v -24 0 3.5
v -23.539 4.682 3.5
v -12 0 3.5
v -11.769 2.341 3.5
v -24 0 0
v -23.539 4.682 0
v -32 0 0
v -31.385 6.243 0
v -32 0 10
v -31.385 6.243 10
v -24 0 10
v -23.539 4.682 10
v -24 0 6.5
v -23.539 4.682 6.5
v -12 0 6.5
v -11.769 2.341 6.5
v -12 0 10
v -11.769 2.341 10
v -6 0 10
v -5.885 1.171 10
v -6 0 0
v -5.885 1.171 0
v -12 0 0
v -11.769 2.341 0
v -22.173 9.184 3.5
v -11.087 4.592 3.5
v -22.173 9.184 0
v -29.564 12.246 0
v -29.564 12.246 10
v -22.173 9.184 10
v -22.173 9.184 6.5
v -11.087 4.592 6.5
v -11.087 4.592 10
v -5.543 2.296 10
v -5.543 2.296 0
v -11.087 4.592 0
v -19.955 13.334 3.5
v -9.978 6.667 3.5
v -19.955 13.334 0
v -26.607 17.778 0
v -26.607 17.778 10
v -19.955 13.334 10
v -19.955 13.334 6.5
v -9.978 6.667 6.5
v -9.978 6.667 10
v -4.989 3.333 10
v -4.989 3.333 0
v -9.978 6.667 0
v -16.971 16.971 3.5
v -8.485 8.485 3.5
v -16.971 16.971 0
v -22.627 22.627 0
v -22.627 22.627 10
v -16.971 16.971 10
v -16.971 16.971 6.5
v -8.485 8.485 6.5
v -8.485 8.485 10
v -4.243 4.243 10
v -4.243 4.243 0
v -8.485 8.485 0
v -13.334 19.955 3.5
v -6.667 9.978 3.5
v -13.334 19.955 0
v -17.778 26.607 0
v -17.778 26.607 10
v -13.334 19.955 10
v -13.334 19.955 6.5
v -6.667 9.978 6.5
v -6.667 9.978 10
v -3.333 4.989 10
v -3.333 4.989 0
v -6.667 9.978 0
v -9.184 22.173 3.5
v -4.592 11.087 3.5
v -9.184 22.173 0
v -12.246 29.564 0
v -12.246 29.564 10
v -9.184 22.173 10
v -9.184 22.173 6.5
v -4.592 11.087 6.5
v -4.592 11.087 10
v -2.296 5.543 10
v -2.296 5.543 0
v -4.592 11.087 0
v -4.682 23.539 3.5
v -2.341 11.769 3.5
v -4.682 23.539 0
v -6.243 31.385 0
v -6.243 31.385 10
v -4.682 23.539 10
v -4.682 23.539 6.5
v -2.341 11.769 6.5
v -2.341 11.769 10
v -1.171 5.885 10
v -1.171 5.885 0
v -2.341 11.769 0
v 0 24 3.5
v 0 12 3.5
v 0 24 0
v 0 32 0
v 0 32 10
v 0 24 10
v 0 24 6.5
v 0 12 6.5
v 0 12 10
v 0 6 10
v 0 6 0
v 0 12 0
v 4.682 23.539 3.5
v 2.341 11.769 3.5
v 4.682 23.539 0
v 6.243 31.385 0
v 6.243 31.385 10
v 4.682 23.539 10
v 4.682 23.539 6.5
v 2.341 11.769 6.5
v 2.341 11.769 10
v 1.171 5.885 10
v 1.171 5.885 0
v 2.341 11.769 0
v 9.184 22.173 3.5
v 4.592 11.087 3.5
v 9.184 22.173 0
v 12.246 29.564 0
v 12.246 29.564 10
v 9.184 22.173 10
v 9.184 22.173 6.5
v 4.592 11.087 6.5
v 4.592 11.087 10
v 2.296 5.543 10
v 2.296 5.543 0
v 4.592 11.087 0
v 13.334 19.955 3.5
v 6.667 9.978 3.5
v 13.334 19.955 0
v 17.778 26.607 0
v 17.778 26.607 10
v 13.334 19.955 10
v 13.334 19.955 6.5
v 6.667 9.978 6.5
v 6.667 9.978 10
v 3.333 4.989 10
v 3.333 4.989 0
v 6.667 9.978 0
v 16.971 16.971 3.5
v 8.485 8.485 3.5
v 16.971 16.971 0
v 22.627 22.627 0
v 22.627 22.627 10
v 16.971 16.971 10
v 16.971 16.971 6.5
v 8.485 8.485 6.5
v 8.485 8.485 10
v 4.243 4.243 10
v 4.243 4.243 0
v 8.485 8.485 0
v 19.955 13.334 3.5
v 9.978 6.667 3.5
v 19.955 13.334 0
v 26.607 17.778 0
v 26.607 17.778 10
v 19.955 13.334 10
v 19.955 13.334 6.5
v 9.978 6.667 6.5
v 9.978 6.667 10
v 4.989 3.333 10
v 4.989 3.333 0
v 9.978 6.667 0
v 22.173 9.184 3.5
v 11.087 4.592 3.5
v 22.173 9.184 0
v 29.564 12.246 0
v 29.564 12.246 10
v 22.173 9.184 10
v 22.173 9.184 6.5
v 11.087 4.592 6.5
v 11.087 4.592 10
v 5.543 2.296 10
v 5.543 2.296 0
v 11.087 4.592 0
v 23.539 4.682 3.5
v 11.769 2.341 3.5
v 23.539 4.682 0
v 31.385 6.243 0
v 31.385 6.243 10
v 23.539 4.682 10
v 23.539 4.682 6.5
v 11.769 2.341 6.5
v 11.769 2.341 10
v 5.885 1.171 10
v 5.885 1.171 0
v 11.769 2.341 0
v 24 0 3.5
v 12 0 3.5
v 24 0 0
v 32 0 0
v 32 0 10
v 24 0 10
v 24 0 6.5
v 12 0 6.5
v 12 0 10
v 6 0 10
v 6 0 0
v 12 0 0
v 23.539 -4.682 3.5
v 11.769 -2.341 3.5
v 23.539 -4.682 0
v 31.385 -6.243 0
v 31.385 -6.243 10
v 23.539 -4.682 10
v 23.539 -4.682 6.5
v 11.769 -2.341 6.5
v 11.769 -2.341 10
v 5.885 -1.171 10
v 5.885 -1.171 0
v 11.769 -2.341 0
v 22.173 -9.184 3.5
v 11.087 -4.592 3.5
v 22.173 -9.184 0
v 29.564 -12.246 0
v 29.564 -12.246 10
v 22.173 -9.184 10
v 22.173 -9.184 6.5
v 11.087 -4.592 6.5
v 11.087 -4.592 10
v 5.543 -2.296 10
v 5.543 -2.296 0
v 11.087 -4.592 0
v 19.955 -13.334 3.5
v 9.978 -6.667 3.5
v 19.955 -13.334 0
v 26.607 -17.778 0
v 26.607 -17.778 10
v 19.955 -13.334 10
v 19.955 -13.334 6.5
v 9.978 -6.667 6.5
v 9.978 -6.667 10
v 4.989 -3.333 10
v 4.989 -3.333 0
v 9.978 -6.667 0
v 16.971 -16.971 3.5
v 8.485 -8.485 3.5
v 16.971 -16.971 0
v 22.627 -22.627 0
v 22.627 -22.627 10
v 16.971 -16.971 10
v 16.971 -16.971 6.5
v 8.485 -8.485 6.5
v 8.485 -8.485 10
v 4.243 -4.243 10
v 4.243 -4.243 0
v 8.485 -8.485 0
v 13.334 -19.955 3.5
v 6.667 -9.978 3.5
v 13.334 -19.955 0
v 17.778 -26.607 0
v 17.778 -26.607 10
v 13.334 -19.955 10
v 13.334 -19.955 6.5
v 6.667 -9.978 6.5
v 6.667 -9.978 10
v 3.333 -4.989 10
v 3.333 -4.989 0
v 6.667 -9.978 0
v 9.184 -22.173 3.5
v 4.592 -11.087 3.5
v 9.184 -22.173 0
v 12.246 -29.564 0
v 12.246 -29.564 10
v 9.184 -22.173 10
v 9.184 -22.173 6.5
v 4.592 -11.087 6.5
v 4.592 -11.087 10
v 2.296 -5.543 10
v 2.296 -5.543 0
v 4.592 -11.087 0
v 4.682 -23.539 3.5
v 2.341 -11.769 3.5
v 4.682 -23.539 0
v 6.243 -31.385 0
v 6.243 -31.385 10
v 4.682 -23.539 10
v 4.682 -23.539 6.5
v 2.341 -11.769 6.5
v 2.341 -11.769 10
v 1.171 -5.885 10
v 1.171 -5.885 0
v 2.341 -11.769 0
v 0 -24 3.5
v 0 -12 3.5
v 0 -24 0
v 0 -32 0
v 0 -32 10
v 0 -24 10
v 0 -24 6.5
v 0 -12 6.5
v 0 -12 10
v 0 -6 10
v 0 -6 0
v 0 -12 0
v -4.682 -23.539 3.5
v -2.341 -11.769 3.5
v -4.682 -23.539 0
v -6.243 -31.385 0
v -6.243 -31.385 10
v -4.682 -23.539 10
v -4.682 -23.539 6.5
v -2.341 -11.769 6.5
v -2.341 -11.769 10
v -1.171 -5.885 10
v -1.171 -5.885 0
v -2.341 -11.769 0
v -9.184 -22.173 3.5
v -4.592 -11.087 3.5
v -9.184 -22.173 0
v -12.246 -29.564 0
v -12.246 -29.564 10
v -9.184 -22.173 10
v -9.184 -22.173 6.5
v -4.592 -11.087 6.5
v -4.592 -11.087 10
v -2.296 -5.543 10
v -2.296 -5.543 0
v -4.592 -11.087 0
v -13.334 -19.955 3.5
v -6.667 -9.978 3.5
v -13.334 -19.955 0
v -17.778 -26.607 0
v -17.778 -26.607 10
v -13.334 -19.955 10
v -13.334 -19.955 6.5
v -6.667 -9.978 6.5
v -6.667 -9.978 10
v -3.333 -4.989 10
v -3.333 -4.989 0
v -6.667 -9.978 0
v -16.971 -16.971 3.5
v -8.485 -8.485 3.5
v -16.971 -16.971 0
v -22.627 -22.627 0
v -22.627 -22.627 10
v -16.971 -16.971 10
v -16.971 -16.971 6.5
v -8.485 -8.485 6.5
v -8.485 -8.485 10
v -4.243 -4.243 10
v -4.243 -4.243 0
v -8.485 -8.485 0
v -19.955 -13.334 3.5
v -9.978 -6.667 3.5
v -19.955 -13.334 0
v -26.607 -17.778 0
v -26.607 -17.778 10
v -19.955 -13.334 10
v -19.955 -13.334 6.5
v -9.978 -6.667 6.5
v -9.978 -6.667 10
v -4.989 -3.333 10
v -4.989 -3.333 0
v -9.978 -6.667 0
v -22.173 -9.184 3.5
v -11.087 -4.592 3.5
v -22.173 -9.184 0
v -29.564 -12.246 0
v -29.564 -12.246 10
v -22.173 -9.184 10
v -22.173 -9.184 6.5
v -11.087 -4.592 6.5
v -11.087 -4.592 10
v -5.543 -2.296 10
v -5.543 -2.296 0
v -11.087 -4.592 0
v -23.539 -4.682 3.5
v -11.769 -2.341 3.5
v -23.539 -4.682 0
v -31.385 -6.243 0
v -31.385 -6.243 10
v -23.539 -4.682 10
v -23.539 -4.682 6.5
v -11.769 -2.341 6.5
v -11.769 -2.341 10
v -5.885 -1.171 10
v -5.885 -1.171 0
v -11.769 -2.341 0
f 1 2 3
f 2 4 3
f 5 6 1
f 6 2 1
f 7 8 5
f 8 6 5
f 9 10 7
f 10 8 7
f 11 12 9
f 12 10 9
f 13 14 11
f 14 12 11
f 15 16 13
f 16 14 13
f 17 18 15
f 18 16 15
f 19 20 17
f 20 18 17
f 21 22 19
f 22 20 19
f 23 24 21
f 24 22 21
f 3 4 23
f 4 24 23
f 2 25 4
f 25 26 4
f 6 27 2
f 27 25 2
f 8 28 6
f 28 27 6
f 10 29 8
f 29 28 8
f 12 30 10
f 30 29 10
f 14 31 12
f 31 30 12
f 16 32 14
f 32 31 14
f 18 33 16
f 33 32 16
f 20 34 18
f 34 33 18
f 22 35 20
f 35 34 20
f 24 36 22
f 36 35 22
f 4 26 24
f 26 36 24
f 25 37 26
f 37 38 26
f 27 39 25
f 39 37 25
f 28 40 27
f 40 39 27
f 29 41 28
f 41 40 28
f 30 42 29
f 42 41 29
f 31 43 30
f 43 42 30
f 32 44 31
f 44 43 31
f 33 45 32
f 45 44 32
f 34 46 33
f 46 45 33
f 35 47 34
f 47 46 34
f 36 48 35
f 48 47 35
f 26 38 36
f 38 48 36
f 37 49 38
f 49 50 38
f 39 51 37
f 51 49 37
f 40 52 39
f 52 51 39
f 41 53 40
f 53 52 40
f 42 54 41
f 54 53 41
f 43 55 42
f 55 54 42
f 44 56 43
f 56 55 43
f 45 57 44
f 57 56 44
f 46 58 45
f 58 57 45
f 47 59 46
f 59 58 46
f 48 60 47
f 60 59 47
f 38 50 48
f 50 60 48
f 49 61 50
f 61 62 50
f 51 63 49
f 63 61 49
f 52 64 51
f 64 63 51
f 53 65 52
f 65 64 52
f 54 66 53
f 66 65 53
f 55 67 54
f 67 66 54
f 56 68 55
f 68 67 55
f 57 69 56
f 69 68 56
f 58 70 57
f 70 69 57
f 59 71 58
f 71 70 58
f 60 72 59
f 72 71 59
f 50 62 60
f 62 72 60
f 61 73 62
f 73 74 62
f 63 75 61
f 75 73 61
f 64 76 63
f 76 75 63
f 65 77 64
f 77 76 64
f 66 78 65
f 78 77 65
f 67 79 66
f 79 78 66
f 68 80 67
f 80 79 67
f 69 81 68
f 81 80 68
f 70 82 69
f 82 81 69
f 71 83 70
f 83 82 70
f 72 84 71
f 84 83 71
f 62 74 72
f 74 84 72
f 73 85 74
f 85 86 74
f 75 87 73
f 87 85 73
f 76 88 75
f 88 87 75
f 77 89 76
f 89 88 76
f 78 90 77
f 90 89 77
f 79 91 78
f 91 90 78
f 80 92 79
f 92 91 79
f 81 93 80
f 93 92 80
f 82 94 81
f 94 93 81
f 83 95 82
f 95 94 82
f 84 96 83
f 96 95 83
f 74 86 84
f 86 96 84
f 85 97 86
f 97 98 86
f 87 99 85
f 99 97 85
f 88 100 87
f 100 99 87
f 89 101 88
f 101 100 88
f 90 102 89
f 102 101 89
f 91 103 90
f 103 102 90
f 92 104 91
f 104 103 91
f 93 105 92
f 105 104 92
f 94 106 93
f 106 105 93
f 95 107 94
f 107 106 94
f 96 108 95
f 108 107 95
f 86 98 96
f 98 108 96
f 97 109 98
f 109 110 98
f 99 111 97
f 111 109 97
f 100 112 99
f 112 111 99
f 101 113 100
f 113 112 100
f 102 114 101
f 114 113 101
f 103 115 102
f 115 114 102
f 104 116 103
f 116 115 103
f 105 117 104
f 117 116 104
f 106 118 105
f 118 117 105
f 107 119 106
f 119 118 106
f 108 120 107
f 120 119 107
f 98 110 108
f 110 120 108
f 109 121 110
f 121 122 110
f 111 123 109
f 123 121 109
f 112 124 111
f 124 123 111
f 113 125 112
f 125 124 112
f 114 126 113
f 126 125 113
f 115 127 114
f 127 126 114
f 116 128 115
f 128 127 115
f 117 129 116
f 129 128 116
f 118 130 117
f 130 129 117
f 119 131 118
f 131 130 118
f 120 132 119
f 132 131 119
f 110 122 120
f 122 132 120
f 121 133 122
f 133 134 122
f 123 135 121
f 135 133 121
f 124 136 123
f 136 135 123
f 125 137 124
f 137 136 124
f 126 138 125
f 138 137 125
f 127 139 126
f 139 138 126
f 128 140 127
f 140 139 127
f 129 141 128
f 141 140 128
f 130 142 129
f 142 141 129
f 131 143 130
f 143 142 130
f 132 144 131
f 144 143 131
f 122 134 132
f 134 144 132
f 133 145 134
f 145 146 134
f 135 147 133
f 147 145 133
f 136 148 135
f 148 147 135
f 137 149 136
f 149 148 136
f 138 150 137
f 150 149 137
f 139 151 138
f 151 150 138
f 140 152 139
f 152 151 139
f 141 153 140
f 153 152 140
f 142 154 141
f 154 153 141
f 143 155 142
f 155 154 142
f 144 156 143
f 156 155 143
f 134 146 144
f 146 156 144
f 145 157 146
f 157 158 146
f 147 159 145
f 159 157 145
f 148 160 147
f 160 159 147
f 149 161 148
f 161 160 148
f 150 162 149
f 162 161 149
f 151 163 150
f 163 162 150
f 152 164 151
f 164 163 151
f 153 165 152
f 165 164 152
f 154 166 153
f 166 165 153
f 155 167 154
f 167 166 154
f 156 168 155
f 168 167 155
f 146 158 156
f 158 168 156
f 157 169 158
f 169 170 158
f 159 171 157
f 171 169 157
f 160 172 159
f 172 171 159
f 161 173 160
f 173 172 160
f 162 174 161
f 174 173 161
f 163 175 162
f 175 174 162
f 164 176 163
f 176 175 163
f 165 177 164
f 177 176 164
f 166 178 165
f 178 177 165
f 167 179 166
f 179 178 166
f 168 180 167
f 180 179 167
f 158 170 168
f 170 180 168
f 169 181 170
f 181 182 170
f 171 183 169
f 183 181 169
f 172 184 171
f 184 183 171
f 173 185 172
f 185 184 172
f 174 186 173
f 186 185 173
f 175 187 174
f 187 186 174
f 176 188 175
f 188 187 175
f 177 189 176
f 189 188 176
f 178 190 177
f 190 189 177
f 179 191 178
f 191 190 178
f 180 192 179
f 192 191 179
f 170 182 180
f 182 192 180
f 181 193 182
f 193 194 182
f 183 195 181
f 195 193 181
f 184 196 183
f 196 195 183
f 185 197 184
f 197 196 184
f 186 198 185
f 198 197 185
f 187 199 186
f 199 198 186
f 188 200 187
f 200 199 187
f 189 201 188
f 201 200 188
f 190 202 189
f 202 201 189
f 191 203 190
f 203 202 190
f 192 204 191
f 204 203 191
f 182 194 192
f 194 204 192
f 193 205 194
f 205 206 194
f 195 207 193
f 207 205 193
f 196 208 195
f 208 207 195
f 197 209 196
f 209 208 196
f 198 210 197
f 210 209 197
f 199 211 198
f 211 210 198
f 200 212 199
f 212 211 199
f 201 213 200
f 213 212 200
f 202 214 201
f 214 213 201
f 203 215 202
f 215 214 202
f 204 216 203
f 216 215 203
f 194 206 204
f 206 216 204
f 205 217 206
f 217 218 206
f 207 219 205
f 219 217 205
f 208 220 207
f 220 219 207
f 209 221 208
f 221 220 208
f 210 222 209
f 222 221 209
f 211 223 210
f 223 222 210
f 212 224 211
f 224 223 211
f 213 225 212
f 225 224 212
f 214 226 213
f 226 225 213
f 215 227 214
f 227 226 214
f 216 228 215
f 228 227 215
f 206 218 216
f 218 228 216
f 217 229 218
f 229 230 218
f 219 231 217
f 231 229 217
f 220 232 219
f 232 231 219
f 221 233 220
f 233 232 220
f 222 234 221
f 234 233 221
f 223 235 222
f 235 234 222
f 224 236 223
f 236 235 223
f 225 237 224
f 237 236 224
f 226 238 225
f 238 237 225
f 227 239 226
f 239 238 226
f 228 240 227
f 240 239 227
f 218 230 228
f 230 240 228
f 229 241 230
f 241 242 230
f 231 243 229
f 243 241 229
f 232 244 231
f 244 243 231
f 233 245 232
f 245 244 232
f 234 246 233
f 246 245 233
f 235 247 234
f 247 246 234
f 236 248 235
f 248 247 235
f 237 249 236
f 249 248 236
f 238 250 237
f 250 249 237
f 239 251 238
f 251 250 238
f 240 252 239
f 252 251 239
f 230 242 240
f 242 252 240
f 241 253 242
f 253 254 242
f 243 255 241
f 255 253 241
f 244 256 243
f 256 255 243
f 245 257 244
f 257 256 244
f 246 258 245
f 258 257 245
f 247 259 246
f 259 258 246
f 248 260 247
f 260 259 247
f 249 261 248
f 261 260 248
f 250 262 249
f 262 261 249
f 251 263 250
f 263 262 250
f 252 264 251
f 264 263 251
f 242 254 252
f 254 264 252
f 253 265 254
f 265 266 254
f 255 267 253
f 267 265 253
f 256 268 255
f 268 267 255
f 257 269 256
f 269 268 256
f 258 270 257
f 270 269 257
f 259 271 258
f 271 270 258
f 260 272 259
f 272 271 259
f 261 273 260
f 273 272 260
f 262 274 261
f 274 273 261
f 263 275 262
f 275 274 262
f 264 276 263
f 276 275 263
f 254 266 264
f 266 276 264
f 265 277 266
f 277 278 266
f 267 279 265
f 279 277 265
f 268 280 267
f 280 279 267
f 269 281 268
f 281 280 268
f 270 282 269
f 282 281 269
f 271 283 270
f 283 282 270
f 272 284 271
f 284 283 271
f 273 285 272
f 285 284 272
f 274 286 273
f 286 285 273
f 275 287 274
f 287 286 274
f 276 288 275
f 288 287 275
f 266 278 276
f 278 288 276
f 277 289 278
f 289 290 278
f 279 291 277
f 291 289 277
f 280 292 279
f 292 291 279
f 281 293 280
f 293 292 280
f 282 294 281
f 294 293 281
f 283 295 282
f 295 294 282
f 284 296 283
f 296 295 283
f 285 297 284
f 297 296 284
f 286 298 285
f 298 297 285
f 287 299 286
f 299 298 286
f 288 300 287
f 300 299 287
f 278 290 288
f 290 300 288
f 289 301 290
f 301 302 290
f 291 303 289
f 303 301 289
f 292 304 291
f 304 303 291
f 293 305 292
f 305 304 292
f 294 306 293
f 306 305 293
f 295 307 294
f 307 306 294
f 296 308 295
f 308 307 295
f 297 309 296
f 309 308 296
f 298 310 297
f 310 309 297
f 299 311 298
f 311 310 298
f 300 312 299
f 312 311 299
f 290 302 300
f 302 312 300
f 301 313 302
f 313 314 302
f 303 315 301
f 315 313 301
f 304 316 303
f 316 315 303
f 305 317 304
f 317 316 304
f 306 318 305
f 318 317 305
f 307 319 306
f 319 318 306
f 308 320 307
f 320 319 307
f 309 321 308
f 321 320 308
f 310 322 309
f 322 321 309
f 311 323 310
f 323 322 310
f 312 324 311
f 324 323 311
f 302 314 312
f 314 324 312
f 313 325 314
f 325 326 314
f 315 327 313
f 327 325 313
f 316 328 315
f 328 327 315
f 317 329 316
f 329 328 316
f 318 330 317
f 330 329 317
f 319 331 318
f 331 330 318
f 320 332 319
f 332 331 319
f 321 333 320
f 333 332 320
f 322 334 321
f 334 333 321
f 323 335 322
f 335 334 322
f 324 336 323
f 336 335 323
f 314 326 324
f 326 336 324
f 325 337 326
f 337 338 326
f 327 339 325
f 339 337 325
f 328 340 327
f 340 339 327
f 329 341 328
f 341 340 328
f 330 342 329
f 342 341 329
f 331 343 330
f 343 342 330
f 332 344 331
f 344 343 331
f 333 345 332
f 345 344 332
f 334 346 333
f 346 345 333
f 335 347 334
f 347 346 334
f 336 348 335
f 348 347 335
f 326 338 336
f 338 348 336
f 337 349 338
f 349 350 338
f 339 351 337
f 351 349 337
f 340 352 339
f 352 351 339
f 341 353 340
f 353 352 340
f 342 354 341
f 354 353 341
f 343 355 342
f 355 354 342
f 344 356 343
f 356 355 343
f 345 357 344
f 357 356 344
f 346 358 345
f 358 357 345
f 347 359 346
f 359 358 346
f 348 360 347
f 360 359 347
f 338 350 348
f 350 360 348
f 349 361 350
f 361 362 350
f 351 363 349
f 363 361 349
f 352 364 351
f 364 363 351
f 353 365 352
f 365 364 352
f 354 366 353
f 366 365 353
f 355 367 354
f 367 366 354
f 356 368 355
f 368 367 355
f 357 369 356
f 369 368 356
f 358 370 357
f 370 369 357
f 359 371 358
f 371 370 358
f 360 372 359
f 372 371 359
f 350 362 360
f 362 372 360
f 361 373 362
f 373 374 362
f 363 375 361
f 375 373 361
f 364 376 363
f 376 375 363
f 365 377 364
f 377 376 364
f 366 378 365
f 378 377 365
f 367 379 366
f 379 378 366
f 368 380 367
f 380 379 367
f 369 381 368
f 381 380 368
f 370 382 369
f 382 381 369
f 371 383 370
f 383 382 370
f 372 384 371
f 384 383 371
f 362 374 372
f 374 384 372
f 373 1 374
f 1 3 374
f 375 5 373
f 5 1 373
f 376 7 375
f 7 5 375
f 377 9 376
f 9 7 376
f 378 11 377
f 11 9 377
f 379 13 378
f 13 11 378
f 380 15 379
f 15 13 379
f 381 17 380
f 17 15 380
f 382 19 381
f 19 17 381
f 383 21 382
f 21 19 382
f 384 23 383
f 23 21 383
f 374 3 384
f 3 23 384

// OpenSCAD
$fn = 32;

// ----------------------------------------------------------------------
// Revolved part: handwheel R32
// ----------------------------------------------------------------------

// --- parameters (mm) ---
bore_r = 6;               // bore radius
rim_r = 32;               // rim radius
rim_w = 8;                // rim axial width
rim_t = 10;               // rim diameter height
hub_r = 12;               // hub radius
web_t = 3;                // web thickness
revolve_angle = 360;      // revolve sweep, degrees
fit_tol = 0.1;            // declared fit tolerance (prompt contract)
free_tol = 0.5;           // declared free tolerance (prompt contract)

bore_d = 2 * bore_r;
rim_d = 2 * rim_r;
hub_d = 2 * hub_r;

profile = [[6, 0], [12, 0], [12, 3.5], [24, 3.5], [24, 0], [32, 0], [32, 10], [24, 10], [24, 6.5], [12, 6.5], [12, 10], [6, 10]];  // primary outline, 12 points, counter clockwise

// --- the one profile operation ---
rotate_extrude(angle = revolve_angle) polygon(points = profile);
